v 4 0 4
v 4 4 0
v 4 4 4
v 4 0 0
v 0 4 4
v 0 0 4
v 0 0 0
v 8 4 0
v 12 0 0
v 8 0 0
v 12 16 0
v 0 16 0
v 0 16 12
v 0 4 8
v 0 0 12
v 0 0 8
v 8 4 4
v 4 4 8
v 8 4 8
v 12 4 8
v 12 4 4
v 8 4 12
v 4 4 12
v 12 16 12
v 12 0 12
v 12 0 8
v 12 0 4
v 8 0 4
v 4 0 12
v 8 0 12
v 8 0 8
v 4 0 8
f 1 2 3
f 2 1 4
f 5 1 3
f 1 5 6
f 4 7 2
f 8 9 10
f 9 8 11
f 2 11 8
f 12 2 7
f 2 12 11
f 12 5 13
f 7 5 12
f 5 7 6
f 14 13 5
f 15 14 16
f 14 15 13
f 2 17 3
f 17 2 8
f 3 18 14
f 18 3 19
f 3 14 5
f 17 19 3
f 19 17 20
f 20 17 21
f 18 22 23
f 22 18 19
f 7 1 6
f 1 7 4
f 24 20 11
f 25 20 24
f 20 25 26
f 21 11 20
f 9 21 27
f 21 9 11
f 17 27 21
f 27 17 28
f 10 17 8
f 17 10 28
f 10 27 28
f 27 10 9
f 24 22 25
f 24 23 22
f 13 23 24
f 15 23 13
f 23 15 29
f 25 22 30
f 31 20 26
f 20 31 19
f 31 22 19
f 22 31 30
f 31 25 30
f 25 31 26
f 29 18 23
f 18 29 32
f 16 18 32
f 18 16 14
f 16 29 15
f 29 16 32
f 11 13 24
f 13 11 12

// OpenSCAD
cube([4,4,4]);
translate([8,0,0])
cube([4,4,4]);
translate([8,0,8])
cube([4,4,4]);
translate([0,0,8])
cube([4,4,4]);
translate([0,4,0])
cube(12,1,0);
